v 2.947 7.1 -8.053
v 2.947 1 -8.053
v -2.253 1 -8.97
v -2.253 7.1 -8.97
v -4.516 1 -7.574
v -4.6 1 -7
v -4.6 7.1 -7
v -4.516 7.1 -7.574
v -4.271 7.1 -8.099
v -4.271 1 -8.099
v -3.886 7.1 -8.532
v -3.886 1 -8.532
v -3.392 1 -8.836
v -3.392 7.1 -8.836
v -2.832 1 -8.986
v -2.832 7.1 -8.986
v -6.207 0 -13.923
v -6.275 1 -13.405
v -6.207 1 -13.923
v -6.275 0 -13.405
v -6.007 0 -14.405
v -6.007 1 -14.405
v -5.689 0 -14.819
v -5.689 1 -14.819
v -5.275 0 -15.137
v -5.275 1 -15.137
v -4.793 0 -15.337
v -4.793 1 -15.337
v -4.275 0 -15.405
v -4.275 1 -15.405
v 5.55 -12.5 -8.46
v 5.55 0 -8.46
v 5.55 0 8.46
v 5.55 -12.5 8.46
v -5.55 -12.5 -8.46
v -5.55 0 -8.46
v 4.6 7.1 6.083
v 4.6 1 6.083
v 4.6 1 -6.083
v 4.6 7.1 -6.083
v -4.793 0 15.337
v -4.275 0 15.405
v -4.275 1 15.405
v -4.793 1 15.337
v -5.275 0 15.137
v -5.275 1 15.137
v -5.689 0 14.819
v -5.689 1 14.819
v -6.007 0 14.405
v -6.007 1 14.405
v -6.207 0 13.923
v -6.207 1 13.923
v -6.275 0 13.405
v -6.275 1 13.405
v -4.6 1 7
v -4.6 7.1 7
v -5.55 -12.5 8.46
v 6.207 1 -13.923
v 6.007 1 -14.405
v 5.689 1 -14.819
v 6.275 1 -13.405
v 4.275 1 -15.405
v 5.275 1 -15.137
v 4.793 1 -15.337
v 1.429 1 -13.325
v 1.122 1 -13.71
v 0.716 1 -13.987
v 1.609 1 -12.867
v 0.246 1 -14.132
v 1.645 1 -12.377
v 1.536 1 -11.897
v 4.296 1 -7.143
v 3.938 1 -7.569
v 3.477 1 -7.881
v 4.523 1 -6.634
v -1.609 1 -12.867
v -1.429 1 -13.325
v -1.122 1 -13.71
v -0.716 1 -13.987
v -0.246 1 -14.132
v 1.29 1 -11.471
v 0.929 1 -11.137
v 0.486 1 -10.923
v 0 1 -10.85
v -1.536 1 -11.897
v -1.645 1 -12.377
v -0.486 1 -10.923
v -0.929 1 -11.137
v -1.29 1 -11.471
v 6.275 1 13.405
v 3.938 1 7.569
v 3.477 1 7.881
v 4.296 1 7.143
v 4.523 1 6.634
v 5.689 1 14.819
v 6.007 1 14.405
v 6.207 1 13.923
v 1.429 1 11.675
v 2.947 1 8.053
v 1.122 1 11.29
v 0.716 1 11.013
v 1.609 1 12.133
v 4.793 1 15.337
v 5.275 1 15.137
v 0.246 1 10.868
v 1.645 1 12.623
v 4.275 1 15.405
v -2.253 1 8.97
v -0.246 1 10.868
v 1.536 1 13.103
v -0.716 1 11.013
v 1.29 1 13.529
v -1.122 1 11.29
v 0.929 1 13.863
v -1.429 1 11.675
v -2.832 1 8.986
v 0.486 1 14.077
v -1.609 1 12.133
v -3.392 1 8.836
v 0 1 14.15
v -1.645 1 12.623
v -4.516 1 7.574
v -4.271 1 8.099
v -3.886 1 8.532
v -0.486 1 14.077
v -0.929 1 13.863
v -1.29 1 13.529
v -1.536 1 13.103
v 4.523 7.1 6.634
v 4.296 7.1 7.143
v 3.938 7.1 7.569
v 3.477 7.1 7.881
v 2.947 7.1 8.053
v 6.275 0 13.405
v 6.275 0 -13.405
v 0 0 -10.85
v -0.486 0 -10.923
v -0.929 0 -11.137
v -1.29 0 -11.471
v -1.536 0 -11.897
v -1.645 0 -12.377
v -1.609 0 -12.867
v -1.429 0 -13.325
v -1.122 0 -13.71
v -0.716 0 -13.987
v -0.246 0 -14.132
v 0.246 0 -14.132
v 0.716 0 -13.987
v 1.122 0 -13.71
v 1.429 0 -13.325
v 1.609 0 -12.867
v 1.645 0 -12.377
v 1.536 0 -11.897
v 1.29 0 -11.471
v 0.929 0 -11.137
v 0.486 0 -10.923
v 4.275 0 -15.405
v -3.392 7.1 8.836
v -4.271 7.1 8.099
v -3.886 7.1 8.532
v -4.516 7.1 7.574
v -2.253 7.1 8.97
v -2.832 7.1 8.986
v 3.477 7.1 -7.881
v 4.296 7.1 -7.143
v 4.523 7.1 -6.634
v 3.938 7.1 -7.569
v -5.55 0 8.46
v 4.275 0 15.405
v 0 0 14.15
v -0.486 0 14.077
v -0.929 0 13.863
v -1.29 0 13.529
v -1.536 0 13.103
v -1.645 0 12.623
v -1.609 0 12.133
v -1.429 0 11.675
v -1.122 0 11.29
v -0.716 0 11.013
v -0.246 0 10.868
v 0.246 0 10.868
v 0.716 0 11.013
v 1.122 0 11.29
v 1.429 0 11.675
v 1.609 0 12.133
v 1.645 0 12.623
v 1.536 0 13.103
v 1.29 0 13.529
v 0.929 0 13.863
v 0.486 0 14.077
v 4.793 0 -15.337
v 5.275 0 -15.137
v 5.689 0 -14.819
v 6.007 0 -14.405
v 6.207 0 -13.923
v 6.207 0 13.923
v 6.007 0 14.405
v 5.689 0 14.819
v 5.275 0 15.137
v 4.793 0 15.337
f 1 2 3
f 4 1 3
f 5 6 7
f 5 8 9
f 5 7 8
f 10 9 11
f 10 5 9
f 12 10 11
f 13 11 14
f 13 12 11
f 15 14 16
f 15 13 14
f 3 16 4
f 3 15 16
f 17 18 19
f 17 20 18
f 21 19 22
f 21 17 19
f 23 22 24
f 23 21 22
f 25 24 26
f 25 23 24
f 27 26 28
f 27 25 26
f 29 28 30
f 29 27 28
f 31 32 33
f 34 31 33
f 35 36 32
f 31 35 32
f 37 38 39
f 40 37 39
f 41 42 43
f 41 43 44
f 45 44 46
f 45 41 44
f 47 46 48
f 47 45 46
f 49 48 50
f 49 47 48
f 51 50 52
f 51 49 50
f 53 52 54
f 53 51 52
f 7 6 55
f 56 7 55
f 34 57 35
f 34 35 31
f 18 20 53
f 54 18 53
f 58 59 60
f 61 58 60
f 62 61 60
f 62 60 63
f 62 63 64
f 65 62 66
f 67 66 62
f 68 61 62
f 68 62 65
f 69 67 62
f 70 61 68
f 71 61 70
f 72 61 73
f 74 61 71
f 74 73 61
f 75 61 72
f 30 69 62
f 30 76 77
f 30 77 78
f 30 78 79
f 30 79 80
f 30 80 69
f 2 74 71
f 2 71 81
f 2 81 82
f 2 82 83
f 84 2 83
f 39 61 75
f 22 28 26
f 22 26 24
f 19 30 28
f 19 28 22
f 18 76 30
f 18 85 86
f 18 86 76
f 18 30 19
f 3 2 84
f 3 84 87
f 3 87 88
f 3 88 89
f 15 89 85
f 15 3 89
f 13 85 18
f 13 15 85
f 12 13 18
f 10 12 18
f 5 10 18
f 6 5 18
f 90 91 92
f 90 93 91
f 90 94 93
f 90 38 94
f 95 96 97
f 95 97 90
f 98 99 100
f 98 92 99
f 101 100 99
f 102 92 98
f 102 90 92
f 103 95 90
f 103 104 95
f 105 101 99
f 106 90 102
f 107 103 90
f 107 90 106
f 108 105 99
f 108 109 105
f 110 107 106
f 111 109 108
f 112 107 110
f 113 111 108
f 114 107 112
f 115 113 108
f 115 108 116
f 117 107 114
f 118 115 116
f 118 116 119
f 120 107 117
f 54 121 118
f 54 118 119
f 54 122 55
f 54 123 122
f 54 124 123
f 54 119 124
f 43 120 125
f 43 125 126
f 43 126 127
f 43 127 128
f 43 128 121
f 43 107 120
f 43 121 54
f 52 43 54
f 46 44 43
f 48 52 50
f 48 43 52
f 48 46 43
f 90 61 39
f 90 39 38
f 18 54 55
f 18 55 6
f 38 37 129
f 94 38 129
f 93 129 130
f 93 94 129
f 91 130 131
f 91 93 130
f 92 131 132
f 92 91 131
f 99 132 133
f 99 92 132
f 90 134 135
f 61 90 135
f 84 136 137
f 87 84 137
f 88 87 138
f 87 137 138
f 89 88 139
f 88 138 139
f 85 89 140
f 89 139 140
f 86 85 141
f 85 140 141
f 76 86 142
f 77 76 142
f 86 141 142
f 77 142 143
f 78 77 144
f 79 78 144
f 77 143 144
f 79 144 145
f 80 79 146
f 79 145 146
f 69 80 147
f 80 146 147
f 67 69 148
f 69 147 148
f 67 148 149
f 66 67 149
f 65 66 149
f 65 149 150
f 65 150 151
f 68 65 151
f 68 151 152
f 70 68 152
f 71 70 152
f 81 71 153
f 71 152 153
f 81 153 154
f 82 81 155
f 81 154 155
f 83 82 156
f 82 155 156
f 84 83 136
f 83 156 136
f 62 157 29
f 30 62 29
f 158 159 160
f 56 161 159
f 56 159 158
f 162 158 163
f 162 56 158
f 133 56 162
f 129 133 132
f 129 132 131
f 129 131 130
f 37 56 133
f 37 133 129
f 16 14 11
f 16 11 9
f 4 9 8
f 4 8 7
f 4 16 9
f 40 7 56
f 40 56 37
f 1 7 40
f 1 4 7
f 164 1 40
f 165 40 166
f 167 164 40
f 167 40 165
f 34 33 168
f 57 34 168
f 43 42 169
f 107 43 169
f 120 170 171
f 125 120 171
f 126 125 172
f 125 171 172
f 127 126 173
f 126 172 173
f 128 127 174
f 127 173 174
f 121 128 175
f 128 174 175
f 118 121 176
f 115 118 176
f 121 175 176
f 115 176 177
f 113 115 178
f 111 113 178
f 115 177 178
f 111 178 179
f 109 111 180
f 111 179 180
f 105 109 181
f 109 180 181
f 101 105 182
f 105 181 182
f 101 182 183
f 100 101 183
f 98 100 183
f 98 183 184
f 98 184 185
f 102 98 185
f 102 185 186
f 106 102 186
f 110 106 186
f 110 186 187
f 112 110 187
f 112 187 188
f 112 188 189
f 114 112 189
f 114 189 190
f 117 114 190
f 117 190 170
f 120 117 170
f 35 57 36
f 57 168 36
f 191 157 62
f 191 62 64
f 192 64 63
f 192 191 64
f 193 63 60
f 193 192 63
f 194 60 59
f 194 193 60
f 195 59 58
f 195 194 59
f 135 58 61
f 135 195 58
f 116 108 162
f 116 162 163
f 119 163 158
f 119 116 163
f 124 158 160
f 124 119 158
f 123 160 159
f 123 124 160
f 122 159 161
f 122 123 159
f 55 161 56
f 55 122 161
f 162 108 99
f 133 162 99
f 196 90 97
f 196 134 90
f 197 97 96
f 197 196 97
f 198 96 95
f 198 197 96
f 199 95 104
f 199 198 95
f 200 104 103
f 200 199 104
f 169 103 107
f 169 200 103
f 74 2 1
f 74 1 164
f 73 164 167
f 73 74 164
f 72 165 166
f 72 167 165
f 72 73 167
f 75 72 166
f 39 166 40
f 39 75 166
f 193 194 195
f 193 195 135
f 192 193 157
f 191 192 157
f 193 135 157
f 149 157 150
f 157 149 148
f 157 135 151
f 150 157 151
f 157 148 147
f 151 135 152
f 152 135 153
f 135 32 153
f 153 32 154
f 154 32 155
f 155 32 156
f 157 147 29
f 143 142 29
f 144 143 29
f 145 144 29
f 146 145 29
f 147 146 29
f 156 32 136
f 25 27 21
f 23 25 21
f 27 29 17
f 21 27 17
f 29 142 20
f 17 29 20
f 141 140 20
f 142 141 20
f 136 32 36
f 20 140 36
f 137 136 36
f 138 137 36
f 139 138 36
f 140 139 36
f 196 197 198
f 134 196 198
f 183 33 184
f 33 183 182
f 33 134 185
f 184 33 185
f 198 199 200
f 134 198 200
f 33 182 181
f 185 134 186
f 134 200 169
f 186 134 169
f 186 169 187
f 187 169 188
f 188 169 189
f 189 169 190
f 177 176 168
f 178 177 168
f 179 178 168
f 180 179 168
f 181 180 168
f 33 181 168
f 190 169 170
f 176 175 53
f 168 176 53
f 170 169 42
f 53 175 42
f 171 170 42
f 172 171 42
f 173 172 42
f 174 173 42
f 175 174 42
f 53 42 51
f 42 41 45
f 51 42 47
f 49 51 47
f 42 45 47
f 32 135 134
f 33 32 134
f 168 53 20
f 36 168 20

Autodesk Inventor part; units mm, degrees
ref_plane "YZ Plane" through (0, 0, 0) normal (1, 0, 0) x (0, 1, 0)
ref_plane "XZ Plane" through (0, 0, 0) normal (0, 1, 0) x (-1, 0, 0)
ref_plane "XY Plane" through (0, 0, 0) normal (0, 0, 1) x (1, 0, 0)
sketch "Skizze9" plane through (0, 0, 0) normal (0, 1, 0) x (-1, 0, 0)
  line L0 (4.275, 15.405) -> (-4.275, 15.405)
  line L1 (-6.275, 13.405) -> (-6.275, -13.405)
  line L2 (-4.275, -15.405) -> (4.275, -15.405)
  line L3 (6.275, -13.405) -> (6.275, 13.405)
  line L4 (0, 0) -> (0, -15.405) construction
  line L5 (0, 0) -> (6.275, 0) construction
  arc A0 (6.275, 13.405) -> (4.275, 15.405) centre (4.275, 13.405) ccw
  arc A1 (-6.275, -13.405) -> (-4.275, -15.405) centre (-4.275, -13.405) ccw
  arc A2 (4.275, -15.405) -> (6.275, -13.405) centre (4.275, -13.405) ccw
  arc A3 (-4.275, 15.405) -> (-6.275, 13.405) centre (-4.275, 13.405) ccw
  point P0 (6.275, 15.405)
  point P1 (-6.275, -15.405)
  point P2 (-6.275, 15.405)
  point P3 (6.275, -15.405)
  dimension "d41" = 30.81
  dimension "d42" = 12.55
  dimension "d61" = 2
extrude "Extrusion6" add sketch "Skizze9" along normal blind 1
sketch "Skizze10" plane through (0, 1, 0) normal (0, 1, 0) x (1, 0, 0)
  line L0 (-4.275, -15.405) -> (4.275, -15.405) projected
  line L1 (6.275, -13.405) -> (6.275, 13.405) projected
  line L2 (4.275, 15.405) -> (-4.275, 15.405) projected
  line L3 (-6.275, 13.405) -> (-6.275, -13.405) projected
  line L4 (4.6, -6.0831) -> (4.6, 6.0831)
  line L5 (2.9473, 8.0527) -> (-2.2527, 8.9696)
  line L6 (-4.6, 7) -> (-4.6, -7)
  line L7 (-2.2527, -8.9696) -> (2.9473, -8.0527)
  line L8 (0, 0) -> (-4.6, 0) construction
  line L9 (0, 0) -> (4.6, 0) construction
  line L10 (-4.6, -9.3835) -> (6.275, -9.3835) construction
  line L11 (-4.6, 9.3835) -> (6.275, 9.3835) construction
  arc A0 (-4.6, -7) -> (-2.2527, -8.9696) centre (-2.6, -7) ccw
  arc A1 (-2.2527, 8.9696) -> (-4.6, 7) centre (-2.6, 7) ccw
  arc A2 (2.9473, -8.0527) -> (4.6, -6.0831) centre (2.6, -6.0831) ccw
  arc A3 (4.6, 6.0831) -> (2.9473, 8.0527) centre (2.6, 6.0831) ccw
  arc A4 (4.275, -15.405) -> (6.275, -13.405) centre (4.275, -13.405) ccw projected
  arc A5 (6.275, 13.405) -> (4.275, 15.405) centre (4.275, 13.405) ccw projected
  arc A6 (-4.275, 15.405) -> (-6.275, 13.405) centre (-4.275, 13.405) ccw projected
  arc A7 (-6.275, -13.405) -> (-4.275, -15.405) centre (-4.275, -13.405) ccw projected
  dimension "d45" = 10
  dimension "d46" = 4.6
  dimension "d47" = 4.6
  dimension "d49" = 2
  dimension "d67" = 14
  dimension "d68" = 18
extrude "Extrusion7" add sketch "Skizze10" along normal blind 6.1 contours A2 L7 A0 L6 A1 L5 A3 L4
sketch "Skizze11" plane through (0, 1, 0) normal (0, 1, 0) x (1, 0, 0)
  arc A0 (-2.2527, 8.9696) -> (-4.6, 7) centre (-2.6, 7) ccw projected
  line L0 (-2.2527, 8.9696) -> (2.9473, 8.0527) projected
  arc A1 (4.6, 6.0831) -> (2.9473, 8.0527) centre (2.6, 6.0831) ccw projected
  line L1 (4.6, 6.0831) -> (4.6, -6.0831) projected
  arc A2 (2.9473, -8.0527) -> (4.6, -6.0831) centre (2.6, -6.0831) ccw projected
  line L2 (2.9473, -8.0527) -> (-2.2527, -8.9696) projected
  arc A3 (-4.6, -7) -> (-2.2527, -8.9696) centre (-2.6, -7) ccw projected
  line L3 (-4.6, -7) -> (-4.6, 7) projected
  line L4 (-4.275, -15.405) -> (4.275, -15.405) projected
  line L5 (6.275, -13.405) -> (6.275, 13.405) projected
  line L6 (4.275, 15.405) -> (-4.275, 15.405) projected
  line L7 (-6.275, 13.405) -> (-6.275, -13.405) projected
  line L8 (0, 0) -> (0, 12.5) construction
  line L9 (0, 0) -> (0, -12.5) construction
  arc A4 (4.275, -15.405) -> (6.275, -13.405) centre (4.275, -13.405) ccw projected
  arc A5 (6.275, 13.405) -> (4.275, 15.405) centre (4.275, 13.405) ccw projected
  arc A6 (-4.275, 15.405) -> (-6.275, 13.405) centre (-4.275, 13.405) ccw projected
  arc A7 (-6.275, -13.405) -> (-4.275, -15.405) centre (-4.275, -13.405) ccw projected
  dimension "d52" = 12.5
  dimension "d53" = 12.5
hole "Bohrung3" at (0, 1, 12.5) at (0, 1, -12.5) direction (0, -1, 0) diameter 3.3 end through all
sketch "Skizze12" plane through (0, 0, 0) normal (0, -1, 0) x (1, 0, 0)
  circle A0 centre (0, 12.5) radius 1.65 projected
  circle A1 centre (0, -12.5) radius 1.65 projected
  line L0 (-4.275, 15.405) -> (4.275, 15.405) projected
  arc A2 (-4.275, 15.405) -> (-6.275, 13.405) centre (-4.275, 13.405) ccw projected
  line L1 (-6.275, -13.405) -> (-6.275, 13.405) projected
  arc A3 (-6.275, -13.405) -> (-4.275, -15.405) centre (-4.275, -13.405) ccw projected
  line L2 (4.275, -15.405) -> (-4.275, -15.405) projected
  arc A4 (4.275, -15.405) -> (6.275, -13.405) centre (4.275, -13.405) ccw projected
  line L3 (6.275, 13.405) -> (6.275, -13.405) projected
  arc A5 (6.275, 13.405) -> (4.275, 15.405) centre (4.275, 13.405) ccw projected
  line L4 (-5.55, -8.46) -> (5.55, -8.46)
  line L5 (5.55, -8.46) -> (5.55, 8.46)
  line L6 (5.55, 8.46) -> (-5.55, 8.46)
  line L7 (-5.55, 8.46) -> (-5.55, -8.46)
  line L8 (0, 0) -> (0, 8.46) construction
  line L9 (0, 0) -> (-5.55, 0) construction
  dimension "d62" = 11.1
  dimension "d63" = 16.92
extrude "Extrusion8" add sketch "Skizze12" along normal blind 12.5 contours L7 L6 L5 L4
properties part number "anschluss_daten_2"
